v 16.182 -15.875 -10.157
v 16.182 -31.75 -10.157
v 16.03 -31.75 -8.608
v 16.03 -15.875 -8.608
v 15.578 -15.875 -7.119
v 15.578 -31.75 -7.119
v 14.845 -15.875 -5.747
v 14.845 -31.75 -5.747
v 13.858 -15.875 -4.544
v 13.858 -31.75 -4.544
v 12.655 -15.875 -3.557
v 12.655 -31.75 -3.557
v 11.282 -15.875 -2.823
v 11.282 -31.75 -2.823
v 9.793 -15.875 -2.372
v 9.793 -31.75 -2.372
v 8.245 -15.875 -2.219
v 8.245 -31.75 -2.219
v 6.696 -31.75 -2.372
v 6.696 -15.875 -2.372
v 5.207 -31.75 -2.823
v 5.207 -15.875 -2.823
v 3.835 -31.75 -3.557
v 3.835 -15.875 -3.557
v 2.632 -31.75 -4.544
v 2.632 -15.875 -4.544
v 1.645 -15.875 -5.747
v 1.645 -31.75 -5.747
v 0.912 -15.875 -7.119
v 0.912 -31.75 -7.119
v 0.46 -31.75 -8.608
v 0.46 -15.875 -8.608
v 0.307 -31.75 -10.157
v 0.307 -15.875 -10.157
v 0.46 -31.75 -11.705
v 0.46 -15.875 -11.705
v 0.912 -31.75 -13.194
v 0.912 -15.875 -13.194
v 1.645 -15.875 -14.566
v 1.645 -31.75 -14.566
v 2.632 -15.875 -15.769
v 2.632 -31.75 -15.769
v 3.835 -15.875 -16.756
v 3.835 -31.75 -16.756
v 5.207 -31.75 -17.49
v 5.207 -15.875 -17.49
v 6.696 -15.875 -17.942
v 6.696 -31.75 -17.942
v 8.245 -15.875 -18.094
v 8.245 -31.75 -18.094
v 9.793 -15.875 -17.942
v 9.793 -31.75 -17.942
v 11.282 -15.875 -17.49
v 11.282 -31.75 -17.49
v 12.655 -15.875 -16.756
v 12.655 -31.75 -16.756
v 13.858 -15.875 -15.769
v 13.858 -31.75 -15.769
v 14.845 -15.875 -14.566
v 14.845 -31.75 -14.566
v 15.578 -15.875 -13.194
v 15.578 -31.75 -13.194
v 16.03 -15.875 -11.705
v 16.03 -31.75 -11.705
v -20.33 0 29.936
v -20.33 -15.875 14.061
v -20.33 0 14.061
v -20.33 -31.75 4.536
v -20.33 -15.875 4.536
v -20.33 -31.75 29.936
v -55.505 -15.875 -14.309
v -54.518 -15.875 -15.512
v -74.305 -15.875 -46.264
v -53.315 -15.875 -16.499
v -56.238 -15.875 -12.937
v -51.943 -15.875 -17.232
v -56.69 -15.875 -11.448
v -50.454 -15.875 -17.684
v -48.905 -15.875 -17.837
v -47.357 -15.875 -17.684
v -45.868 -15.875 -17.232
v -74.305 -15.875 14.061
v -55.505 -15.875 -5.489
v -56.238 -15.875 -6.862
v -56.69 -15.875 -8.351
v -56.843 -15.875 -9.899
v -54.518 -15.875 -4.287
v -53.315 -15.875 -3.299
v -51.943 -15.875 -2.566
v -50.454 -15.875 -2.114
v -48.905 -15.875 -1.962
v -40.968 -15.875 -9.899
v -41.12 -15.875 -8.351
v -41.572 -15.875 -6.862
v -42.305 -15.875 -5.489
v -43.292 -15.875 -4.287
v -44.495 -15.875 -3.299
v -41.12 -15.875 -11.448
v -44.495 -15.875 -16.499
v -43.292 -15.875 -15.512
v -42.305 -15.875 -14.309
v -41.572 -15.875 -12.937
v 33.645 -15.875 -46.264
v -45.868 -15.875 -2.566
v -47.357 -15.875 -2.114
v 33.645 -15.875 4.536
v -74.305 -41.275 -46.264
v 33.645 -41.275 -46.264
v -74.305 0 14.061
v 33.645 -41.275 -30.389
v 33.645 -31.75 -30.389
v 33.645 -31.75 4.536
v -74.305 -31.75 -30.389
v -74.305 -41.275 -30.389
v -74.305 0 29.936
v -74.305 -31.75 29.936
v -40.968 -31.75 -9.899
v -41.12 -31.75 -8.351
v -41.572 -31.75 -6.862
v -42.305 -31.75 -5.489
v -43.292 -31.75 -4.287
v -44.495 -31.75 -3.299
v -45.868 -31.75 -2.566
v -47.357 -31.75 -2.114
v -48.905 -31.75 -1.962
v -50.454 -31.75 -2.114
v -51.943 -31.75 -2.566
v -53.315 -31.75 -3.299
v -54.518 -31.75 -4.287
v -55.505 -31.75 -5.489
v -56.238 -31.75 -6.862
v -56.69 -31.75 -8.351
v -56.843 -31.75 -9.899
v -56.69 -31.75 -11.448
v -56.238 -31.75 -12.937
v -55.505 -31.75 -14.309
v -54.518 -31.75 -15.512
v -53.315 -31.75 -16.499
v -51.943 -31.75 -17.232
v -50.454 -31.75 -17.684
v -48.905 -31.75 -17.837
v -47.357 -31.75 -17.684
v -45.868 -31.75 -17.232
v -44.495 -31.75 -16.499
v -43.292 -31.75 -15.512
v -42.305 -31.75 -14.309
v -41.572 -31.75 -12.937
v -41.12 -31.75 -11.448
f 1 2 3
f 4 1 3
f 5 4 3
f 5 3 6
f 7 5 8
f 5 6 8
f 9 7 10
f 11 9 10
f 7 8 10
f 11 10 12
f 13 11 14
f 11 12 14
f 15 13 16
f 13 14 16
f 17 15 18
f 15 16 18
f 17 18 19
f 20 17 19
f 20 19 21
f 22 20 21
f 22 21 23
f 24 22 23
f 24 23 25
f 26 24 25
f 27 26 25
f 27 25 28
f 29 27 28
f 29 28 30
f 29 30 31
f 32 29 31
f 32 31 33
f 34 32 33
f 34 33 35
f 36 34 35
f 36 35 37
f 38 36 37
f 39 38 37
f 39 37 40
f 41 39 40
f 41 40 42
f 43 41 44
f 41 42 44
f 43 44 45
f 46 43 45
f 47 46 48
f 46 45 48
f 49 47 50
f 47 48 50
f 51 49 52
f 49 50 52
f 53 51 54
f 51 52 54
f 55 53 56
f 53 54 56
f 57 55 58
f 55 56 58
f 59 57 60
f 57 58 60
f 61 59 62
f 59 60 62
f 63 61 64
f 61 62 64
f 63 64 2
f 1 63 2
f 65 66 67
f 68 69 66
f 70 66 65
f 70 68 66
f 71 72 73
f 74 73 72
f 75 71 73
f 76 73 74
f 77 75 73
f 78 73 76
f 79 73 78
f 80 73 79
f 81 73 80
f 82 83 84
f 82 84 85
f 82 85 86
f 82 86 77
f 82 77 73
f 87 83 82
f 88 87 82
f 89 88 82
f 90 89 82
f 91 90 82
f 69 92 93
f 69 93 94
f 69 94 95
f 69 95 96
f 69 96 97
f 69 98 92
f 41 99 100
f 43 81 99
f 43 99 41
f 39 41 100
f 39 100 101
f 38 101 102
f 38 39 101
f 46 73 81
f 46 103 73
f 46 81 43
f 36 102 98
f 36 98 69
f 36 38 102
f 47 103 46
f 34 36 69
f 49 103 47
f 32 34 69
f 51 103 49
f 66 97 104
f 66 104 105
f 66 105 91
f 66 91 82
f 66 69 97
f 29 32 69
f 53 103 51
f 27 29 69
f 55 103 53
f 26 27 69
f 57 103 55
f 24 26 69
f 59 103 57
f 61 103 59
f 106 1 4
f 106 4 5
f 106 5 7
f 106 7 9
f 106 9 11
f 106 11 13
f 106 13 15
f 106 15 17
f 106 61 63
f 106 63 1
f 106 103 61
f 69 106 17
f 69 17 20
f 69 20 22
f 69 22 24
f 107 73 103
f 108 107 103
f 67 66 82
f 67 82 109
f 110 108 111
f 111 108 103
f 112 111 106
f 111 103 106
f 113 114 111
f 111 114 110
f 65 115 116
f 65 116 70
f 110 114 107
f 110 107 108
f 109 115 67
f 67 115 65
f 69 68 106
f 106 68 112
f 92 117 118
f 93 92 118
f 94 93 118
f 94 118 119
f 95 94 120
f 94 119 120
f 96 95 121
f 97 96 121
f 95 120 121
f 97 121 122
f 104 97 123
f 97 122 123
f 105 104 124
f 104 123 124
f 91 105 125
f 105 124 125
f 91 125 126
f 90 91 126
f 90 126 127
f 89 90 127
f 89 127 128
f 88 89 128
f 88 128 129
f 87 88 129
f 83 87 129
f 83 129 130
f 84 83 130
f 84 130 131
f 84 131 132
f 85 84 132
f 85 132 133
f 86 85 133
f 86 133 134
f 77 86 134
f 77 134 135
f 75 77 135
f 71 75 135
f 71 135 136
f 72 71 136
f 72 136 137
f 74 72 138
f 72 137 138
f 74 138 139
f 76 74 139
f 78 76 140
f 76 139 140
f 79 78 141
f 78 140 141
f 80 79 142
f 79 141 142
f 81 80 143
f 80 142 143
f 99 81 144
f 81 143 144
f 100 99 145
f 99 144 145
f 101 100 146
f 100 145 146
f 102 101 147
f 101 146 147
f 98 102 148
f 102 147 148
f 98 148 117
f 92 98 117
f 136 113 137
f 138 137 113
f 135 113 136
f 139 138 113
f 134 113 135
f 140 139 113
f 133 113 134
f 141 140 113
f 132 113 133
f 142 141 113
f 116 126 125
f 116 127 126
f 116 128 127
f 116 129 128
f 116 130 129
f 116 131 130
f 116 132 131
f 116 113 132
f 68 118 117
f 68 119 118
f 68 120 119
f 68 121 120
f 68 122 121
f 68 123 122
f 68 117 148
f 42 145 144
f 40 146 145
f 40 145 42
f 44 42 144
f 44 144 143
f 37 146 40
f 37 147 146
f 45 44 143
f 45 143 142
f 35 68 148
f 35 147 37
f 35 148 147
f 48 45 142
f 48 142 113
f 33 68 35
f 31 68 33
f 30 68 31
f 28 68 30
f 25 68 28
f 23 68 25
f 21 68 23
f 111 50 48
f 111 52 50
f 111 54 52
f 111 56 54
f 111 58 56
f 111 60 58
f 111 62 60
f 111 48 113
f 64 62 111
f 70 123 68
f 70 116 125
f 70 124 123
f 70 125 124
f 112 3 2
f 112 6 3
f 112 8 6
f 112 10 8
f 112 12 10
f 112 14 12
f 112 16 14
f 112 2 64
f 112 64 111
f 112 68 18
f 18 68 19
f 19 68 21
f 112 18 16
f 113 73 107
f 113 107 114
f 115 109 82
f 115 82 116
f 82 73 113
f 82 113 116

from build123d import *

# Parameters (mm, degrees)
F0_W      = 107.95
F0_H      = 76.2
F1_DEPTH  = 41.275
F2_W      = 107.95
F2_H      = 60.325
F3_DEPTH  = 9.525
F4_W      = 53.975
F4_H      = 25.4
F5_DEPTH  = 31.751
F6_W      = 15.875
F6_H      = 50.8
F7_DEPTH  = 107.951
F8_W      = 15.875
F8_H      = 9.525
F9_DEPTH  = 53.976
F10_R     = 7.9375
F11_DEPTH = 31.751


with BuildPart() as f1:
    # F0 (on Front) → F1 (new body)
    with BuildSketch(Plane.XZ):
        with Locations((-20.33008, -8.164287)):
            Rectangle(F0_W, F0_H)
    extrude(amount=F1_DEPTH)

    # F2 (on face) → F3 (cut)
    with BuildSketch(Plane.XZ.offset(41.275)):
        with Locations((-20.33008, -0.226787)):
            Rectangle(F2_W, F2_H)
    extrude(amount=-F3_DEPTH, mode=Mode.SUBTRACT)

    # F4 (on face) → F5 (cut, through all)
    with BuildSketch(Plane.XZ.offset(31.75)):
        with Locations((6.65742, 17.235713)):
            Rectangle(F4_W, F4_H)
    extrude(amount=-F5_DEPTH, mode=Mode.SUBTRACT)

    # F6 (on face) → F7 (cut, through all)
    with BuildSketch(Plane.YZ.offset(33.64492)):
        with Locations((-7.9375, -20.864287)):
            Rectangle(F6_W, F6_H)
    extrude(amount=-F7_DEPTH, mode=Mode.SUBTRACT)

    # F8 (on face) → F9 (cut, through all)
    with BuildSketch(Plane.YZ.offset(-20.33008)):
        with Locations((-7.9375, 9.298213)):
            Rectangle(F8_W, F8_H)
    extrude(amount=-F9_DEPTH, mode=Mode.SUBTRACT)

    # F10 (on face) → F11 (cut, through all)
    with BuildSketch(Plane.XZ.offset(31.75)):
        with Locations((-48.90508, -9.899196)):
            Circle(F10_R)
        with Locations((8.24492, -10.156629)):
            Circle(F10_R)
    extrude(amount=-F11_DEPTH, mode=Mode.SUBTRACT)


solid = f1.part
